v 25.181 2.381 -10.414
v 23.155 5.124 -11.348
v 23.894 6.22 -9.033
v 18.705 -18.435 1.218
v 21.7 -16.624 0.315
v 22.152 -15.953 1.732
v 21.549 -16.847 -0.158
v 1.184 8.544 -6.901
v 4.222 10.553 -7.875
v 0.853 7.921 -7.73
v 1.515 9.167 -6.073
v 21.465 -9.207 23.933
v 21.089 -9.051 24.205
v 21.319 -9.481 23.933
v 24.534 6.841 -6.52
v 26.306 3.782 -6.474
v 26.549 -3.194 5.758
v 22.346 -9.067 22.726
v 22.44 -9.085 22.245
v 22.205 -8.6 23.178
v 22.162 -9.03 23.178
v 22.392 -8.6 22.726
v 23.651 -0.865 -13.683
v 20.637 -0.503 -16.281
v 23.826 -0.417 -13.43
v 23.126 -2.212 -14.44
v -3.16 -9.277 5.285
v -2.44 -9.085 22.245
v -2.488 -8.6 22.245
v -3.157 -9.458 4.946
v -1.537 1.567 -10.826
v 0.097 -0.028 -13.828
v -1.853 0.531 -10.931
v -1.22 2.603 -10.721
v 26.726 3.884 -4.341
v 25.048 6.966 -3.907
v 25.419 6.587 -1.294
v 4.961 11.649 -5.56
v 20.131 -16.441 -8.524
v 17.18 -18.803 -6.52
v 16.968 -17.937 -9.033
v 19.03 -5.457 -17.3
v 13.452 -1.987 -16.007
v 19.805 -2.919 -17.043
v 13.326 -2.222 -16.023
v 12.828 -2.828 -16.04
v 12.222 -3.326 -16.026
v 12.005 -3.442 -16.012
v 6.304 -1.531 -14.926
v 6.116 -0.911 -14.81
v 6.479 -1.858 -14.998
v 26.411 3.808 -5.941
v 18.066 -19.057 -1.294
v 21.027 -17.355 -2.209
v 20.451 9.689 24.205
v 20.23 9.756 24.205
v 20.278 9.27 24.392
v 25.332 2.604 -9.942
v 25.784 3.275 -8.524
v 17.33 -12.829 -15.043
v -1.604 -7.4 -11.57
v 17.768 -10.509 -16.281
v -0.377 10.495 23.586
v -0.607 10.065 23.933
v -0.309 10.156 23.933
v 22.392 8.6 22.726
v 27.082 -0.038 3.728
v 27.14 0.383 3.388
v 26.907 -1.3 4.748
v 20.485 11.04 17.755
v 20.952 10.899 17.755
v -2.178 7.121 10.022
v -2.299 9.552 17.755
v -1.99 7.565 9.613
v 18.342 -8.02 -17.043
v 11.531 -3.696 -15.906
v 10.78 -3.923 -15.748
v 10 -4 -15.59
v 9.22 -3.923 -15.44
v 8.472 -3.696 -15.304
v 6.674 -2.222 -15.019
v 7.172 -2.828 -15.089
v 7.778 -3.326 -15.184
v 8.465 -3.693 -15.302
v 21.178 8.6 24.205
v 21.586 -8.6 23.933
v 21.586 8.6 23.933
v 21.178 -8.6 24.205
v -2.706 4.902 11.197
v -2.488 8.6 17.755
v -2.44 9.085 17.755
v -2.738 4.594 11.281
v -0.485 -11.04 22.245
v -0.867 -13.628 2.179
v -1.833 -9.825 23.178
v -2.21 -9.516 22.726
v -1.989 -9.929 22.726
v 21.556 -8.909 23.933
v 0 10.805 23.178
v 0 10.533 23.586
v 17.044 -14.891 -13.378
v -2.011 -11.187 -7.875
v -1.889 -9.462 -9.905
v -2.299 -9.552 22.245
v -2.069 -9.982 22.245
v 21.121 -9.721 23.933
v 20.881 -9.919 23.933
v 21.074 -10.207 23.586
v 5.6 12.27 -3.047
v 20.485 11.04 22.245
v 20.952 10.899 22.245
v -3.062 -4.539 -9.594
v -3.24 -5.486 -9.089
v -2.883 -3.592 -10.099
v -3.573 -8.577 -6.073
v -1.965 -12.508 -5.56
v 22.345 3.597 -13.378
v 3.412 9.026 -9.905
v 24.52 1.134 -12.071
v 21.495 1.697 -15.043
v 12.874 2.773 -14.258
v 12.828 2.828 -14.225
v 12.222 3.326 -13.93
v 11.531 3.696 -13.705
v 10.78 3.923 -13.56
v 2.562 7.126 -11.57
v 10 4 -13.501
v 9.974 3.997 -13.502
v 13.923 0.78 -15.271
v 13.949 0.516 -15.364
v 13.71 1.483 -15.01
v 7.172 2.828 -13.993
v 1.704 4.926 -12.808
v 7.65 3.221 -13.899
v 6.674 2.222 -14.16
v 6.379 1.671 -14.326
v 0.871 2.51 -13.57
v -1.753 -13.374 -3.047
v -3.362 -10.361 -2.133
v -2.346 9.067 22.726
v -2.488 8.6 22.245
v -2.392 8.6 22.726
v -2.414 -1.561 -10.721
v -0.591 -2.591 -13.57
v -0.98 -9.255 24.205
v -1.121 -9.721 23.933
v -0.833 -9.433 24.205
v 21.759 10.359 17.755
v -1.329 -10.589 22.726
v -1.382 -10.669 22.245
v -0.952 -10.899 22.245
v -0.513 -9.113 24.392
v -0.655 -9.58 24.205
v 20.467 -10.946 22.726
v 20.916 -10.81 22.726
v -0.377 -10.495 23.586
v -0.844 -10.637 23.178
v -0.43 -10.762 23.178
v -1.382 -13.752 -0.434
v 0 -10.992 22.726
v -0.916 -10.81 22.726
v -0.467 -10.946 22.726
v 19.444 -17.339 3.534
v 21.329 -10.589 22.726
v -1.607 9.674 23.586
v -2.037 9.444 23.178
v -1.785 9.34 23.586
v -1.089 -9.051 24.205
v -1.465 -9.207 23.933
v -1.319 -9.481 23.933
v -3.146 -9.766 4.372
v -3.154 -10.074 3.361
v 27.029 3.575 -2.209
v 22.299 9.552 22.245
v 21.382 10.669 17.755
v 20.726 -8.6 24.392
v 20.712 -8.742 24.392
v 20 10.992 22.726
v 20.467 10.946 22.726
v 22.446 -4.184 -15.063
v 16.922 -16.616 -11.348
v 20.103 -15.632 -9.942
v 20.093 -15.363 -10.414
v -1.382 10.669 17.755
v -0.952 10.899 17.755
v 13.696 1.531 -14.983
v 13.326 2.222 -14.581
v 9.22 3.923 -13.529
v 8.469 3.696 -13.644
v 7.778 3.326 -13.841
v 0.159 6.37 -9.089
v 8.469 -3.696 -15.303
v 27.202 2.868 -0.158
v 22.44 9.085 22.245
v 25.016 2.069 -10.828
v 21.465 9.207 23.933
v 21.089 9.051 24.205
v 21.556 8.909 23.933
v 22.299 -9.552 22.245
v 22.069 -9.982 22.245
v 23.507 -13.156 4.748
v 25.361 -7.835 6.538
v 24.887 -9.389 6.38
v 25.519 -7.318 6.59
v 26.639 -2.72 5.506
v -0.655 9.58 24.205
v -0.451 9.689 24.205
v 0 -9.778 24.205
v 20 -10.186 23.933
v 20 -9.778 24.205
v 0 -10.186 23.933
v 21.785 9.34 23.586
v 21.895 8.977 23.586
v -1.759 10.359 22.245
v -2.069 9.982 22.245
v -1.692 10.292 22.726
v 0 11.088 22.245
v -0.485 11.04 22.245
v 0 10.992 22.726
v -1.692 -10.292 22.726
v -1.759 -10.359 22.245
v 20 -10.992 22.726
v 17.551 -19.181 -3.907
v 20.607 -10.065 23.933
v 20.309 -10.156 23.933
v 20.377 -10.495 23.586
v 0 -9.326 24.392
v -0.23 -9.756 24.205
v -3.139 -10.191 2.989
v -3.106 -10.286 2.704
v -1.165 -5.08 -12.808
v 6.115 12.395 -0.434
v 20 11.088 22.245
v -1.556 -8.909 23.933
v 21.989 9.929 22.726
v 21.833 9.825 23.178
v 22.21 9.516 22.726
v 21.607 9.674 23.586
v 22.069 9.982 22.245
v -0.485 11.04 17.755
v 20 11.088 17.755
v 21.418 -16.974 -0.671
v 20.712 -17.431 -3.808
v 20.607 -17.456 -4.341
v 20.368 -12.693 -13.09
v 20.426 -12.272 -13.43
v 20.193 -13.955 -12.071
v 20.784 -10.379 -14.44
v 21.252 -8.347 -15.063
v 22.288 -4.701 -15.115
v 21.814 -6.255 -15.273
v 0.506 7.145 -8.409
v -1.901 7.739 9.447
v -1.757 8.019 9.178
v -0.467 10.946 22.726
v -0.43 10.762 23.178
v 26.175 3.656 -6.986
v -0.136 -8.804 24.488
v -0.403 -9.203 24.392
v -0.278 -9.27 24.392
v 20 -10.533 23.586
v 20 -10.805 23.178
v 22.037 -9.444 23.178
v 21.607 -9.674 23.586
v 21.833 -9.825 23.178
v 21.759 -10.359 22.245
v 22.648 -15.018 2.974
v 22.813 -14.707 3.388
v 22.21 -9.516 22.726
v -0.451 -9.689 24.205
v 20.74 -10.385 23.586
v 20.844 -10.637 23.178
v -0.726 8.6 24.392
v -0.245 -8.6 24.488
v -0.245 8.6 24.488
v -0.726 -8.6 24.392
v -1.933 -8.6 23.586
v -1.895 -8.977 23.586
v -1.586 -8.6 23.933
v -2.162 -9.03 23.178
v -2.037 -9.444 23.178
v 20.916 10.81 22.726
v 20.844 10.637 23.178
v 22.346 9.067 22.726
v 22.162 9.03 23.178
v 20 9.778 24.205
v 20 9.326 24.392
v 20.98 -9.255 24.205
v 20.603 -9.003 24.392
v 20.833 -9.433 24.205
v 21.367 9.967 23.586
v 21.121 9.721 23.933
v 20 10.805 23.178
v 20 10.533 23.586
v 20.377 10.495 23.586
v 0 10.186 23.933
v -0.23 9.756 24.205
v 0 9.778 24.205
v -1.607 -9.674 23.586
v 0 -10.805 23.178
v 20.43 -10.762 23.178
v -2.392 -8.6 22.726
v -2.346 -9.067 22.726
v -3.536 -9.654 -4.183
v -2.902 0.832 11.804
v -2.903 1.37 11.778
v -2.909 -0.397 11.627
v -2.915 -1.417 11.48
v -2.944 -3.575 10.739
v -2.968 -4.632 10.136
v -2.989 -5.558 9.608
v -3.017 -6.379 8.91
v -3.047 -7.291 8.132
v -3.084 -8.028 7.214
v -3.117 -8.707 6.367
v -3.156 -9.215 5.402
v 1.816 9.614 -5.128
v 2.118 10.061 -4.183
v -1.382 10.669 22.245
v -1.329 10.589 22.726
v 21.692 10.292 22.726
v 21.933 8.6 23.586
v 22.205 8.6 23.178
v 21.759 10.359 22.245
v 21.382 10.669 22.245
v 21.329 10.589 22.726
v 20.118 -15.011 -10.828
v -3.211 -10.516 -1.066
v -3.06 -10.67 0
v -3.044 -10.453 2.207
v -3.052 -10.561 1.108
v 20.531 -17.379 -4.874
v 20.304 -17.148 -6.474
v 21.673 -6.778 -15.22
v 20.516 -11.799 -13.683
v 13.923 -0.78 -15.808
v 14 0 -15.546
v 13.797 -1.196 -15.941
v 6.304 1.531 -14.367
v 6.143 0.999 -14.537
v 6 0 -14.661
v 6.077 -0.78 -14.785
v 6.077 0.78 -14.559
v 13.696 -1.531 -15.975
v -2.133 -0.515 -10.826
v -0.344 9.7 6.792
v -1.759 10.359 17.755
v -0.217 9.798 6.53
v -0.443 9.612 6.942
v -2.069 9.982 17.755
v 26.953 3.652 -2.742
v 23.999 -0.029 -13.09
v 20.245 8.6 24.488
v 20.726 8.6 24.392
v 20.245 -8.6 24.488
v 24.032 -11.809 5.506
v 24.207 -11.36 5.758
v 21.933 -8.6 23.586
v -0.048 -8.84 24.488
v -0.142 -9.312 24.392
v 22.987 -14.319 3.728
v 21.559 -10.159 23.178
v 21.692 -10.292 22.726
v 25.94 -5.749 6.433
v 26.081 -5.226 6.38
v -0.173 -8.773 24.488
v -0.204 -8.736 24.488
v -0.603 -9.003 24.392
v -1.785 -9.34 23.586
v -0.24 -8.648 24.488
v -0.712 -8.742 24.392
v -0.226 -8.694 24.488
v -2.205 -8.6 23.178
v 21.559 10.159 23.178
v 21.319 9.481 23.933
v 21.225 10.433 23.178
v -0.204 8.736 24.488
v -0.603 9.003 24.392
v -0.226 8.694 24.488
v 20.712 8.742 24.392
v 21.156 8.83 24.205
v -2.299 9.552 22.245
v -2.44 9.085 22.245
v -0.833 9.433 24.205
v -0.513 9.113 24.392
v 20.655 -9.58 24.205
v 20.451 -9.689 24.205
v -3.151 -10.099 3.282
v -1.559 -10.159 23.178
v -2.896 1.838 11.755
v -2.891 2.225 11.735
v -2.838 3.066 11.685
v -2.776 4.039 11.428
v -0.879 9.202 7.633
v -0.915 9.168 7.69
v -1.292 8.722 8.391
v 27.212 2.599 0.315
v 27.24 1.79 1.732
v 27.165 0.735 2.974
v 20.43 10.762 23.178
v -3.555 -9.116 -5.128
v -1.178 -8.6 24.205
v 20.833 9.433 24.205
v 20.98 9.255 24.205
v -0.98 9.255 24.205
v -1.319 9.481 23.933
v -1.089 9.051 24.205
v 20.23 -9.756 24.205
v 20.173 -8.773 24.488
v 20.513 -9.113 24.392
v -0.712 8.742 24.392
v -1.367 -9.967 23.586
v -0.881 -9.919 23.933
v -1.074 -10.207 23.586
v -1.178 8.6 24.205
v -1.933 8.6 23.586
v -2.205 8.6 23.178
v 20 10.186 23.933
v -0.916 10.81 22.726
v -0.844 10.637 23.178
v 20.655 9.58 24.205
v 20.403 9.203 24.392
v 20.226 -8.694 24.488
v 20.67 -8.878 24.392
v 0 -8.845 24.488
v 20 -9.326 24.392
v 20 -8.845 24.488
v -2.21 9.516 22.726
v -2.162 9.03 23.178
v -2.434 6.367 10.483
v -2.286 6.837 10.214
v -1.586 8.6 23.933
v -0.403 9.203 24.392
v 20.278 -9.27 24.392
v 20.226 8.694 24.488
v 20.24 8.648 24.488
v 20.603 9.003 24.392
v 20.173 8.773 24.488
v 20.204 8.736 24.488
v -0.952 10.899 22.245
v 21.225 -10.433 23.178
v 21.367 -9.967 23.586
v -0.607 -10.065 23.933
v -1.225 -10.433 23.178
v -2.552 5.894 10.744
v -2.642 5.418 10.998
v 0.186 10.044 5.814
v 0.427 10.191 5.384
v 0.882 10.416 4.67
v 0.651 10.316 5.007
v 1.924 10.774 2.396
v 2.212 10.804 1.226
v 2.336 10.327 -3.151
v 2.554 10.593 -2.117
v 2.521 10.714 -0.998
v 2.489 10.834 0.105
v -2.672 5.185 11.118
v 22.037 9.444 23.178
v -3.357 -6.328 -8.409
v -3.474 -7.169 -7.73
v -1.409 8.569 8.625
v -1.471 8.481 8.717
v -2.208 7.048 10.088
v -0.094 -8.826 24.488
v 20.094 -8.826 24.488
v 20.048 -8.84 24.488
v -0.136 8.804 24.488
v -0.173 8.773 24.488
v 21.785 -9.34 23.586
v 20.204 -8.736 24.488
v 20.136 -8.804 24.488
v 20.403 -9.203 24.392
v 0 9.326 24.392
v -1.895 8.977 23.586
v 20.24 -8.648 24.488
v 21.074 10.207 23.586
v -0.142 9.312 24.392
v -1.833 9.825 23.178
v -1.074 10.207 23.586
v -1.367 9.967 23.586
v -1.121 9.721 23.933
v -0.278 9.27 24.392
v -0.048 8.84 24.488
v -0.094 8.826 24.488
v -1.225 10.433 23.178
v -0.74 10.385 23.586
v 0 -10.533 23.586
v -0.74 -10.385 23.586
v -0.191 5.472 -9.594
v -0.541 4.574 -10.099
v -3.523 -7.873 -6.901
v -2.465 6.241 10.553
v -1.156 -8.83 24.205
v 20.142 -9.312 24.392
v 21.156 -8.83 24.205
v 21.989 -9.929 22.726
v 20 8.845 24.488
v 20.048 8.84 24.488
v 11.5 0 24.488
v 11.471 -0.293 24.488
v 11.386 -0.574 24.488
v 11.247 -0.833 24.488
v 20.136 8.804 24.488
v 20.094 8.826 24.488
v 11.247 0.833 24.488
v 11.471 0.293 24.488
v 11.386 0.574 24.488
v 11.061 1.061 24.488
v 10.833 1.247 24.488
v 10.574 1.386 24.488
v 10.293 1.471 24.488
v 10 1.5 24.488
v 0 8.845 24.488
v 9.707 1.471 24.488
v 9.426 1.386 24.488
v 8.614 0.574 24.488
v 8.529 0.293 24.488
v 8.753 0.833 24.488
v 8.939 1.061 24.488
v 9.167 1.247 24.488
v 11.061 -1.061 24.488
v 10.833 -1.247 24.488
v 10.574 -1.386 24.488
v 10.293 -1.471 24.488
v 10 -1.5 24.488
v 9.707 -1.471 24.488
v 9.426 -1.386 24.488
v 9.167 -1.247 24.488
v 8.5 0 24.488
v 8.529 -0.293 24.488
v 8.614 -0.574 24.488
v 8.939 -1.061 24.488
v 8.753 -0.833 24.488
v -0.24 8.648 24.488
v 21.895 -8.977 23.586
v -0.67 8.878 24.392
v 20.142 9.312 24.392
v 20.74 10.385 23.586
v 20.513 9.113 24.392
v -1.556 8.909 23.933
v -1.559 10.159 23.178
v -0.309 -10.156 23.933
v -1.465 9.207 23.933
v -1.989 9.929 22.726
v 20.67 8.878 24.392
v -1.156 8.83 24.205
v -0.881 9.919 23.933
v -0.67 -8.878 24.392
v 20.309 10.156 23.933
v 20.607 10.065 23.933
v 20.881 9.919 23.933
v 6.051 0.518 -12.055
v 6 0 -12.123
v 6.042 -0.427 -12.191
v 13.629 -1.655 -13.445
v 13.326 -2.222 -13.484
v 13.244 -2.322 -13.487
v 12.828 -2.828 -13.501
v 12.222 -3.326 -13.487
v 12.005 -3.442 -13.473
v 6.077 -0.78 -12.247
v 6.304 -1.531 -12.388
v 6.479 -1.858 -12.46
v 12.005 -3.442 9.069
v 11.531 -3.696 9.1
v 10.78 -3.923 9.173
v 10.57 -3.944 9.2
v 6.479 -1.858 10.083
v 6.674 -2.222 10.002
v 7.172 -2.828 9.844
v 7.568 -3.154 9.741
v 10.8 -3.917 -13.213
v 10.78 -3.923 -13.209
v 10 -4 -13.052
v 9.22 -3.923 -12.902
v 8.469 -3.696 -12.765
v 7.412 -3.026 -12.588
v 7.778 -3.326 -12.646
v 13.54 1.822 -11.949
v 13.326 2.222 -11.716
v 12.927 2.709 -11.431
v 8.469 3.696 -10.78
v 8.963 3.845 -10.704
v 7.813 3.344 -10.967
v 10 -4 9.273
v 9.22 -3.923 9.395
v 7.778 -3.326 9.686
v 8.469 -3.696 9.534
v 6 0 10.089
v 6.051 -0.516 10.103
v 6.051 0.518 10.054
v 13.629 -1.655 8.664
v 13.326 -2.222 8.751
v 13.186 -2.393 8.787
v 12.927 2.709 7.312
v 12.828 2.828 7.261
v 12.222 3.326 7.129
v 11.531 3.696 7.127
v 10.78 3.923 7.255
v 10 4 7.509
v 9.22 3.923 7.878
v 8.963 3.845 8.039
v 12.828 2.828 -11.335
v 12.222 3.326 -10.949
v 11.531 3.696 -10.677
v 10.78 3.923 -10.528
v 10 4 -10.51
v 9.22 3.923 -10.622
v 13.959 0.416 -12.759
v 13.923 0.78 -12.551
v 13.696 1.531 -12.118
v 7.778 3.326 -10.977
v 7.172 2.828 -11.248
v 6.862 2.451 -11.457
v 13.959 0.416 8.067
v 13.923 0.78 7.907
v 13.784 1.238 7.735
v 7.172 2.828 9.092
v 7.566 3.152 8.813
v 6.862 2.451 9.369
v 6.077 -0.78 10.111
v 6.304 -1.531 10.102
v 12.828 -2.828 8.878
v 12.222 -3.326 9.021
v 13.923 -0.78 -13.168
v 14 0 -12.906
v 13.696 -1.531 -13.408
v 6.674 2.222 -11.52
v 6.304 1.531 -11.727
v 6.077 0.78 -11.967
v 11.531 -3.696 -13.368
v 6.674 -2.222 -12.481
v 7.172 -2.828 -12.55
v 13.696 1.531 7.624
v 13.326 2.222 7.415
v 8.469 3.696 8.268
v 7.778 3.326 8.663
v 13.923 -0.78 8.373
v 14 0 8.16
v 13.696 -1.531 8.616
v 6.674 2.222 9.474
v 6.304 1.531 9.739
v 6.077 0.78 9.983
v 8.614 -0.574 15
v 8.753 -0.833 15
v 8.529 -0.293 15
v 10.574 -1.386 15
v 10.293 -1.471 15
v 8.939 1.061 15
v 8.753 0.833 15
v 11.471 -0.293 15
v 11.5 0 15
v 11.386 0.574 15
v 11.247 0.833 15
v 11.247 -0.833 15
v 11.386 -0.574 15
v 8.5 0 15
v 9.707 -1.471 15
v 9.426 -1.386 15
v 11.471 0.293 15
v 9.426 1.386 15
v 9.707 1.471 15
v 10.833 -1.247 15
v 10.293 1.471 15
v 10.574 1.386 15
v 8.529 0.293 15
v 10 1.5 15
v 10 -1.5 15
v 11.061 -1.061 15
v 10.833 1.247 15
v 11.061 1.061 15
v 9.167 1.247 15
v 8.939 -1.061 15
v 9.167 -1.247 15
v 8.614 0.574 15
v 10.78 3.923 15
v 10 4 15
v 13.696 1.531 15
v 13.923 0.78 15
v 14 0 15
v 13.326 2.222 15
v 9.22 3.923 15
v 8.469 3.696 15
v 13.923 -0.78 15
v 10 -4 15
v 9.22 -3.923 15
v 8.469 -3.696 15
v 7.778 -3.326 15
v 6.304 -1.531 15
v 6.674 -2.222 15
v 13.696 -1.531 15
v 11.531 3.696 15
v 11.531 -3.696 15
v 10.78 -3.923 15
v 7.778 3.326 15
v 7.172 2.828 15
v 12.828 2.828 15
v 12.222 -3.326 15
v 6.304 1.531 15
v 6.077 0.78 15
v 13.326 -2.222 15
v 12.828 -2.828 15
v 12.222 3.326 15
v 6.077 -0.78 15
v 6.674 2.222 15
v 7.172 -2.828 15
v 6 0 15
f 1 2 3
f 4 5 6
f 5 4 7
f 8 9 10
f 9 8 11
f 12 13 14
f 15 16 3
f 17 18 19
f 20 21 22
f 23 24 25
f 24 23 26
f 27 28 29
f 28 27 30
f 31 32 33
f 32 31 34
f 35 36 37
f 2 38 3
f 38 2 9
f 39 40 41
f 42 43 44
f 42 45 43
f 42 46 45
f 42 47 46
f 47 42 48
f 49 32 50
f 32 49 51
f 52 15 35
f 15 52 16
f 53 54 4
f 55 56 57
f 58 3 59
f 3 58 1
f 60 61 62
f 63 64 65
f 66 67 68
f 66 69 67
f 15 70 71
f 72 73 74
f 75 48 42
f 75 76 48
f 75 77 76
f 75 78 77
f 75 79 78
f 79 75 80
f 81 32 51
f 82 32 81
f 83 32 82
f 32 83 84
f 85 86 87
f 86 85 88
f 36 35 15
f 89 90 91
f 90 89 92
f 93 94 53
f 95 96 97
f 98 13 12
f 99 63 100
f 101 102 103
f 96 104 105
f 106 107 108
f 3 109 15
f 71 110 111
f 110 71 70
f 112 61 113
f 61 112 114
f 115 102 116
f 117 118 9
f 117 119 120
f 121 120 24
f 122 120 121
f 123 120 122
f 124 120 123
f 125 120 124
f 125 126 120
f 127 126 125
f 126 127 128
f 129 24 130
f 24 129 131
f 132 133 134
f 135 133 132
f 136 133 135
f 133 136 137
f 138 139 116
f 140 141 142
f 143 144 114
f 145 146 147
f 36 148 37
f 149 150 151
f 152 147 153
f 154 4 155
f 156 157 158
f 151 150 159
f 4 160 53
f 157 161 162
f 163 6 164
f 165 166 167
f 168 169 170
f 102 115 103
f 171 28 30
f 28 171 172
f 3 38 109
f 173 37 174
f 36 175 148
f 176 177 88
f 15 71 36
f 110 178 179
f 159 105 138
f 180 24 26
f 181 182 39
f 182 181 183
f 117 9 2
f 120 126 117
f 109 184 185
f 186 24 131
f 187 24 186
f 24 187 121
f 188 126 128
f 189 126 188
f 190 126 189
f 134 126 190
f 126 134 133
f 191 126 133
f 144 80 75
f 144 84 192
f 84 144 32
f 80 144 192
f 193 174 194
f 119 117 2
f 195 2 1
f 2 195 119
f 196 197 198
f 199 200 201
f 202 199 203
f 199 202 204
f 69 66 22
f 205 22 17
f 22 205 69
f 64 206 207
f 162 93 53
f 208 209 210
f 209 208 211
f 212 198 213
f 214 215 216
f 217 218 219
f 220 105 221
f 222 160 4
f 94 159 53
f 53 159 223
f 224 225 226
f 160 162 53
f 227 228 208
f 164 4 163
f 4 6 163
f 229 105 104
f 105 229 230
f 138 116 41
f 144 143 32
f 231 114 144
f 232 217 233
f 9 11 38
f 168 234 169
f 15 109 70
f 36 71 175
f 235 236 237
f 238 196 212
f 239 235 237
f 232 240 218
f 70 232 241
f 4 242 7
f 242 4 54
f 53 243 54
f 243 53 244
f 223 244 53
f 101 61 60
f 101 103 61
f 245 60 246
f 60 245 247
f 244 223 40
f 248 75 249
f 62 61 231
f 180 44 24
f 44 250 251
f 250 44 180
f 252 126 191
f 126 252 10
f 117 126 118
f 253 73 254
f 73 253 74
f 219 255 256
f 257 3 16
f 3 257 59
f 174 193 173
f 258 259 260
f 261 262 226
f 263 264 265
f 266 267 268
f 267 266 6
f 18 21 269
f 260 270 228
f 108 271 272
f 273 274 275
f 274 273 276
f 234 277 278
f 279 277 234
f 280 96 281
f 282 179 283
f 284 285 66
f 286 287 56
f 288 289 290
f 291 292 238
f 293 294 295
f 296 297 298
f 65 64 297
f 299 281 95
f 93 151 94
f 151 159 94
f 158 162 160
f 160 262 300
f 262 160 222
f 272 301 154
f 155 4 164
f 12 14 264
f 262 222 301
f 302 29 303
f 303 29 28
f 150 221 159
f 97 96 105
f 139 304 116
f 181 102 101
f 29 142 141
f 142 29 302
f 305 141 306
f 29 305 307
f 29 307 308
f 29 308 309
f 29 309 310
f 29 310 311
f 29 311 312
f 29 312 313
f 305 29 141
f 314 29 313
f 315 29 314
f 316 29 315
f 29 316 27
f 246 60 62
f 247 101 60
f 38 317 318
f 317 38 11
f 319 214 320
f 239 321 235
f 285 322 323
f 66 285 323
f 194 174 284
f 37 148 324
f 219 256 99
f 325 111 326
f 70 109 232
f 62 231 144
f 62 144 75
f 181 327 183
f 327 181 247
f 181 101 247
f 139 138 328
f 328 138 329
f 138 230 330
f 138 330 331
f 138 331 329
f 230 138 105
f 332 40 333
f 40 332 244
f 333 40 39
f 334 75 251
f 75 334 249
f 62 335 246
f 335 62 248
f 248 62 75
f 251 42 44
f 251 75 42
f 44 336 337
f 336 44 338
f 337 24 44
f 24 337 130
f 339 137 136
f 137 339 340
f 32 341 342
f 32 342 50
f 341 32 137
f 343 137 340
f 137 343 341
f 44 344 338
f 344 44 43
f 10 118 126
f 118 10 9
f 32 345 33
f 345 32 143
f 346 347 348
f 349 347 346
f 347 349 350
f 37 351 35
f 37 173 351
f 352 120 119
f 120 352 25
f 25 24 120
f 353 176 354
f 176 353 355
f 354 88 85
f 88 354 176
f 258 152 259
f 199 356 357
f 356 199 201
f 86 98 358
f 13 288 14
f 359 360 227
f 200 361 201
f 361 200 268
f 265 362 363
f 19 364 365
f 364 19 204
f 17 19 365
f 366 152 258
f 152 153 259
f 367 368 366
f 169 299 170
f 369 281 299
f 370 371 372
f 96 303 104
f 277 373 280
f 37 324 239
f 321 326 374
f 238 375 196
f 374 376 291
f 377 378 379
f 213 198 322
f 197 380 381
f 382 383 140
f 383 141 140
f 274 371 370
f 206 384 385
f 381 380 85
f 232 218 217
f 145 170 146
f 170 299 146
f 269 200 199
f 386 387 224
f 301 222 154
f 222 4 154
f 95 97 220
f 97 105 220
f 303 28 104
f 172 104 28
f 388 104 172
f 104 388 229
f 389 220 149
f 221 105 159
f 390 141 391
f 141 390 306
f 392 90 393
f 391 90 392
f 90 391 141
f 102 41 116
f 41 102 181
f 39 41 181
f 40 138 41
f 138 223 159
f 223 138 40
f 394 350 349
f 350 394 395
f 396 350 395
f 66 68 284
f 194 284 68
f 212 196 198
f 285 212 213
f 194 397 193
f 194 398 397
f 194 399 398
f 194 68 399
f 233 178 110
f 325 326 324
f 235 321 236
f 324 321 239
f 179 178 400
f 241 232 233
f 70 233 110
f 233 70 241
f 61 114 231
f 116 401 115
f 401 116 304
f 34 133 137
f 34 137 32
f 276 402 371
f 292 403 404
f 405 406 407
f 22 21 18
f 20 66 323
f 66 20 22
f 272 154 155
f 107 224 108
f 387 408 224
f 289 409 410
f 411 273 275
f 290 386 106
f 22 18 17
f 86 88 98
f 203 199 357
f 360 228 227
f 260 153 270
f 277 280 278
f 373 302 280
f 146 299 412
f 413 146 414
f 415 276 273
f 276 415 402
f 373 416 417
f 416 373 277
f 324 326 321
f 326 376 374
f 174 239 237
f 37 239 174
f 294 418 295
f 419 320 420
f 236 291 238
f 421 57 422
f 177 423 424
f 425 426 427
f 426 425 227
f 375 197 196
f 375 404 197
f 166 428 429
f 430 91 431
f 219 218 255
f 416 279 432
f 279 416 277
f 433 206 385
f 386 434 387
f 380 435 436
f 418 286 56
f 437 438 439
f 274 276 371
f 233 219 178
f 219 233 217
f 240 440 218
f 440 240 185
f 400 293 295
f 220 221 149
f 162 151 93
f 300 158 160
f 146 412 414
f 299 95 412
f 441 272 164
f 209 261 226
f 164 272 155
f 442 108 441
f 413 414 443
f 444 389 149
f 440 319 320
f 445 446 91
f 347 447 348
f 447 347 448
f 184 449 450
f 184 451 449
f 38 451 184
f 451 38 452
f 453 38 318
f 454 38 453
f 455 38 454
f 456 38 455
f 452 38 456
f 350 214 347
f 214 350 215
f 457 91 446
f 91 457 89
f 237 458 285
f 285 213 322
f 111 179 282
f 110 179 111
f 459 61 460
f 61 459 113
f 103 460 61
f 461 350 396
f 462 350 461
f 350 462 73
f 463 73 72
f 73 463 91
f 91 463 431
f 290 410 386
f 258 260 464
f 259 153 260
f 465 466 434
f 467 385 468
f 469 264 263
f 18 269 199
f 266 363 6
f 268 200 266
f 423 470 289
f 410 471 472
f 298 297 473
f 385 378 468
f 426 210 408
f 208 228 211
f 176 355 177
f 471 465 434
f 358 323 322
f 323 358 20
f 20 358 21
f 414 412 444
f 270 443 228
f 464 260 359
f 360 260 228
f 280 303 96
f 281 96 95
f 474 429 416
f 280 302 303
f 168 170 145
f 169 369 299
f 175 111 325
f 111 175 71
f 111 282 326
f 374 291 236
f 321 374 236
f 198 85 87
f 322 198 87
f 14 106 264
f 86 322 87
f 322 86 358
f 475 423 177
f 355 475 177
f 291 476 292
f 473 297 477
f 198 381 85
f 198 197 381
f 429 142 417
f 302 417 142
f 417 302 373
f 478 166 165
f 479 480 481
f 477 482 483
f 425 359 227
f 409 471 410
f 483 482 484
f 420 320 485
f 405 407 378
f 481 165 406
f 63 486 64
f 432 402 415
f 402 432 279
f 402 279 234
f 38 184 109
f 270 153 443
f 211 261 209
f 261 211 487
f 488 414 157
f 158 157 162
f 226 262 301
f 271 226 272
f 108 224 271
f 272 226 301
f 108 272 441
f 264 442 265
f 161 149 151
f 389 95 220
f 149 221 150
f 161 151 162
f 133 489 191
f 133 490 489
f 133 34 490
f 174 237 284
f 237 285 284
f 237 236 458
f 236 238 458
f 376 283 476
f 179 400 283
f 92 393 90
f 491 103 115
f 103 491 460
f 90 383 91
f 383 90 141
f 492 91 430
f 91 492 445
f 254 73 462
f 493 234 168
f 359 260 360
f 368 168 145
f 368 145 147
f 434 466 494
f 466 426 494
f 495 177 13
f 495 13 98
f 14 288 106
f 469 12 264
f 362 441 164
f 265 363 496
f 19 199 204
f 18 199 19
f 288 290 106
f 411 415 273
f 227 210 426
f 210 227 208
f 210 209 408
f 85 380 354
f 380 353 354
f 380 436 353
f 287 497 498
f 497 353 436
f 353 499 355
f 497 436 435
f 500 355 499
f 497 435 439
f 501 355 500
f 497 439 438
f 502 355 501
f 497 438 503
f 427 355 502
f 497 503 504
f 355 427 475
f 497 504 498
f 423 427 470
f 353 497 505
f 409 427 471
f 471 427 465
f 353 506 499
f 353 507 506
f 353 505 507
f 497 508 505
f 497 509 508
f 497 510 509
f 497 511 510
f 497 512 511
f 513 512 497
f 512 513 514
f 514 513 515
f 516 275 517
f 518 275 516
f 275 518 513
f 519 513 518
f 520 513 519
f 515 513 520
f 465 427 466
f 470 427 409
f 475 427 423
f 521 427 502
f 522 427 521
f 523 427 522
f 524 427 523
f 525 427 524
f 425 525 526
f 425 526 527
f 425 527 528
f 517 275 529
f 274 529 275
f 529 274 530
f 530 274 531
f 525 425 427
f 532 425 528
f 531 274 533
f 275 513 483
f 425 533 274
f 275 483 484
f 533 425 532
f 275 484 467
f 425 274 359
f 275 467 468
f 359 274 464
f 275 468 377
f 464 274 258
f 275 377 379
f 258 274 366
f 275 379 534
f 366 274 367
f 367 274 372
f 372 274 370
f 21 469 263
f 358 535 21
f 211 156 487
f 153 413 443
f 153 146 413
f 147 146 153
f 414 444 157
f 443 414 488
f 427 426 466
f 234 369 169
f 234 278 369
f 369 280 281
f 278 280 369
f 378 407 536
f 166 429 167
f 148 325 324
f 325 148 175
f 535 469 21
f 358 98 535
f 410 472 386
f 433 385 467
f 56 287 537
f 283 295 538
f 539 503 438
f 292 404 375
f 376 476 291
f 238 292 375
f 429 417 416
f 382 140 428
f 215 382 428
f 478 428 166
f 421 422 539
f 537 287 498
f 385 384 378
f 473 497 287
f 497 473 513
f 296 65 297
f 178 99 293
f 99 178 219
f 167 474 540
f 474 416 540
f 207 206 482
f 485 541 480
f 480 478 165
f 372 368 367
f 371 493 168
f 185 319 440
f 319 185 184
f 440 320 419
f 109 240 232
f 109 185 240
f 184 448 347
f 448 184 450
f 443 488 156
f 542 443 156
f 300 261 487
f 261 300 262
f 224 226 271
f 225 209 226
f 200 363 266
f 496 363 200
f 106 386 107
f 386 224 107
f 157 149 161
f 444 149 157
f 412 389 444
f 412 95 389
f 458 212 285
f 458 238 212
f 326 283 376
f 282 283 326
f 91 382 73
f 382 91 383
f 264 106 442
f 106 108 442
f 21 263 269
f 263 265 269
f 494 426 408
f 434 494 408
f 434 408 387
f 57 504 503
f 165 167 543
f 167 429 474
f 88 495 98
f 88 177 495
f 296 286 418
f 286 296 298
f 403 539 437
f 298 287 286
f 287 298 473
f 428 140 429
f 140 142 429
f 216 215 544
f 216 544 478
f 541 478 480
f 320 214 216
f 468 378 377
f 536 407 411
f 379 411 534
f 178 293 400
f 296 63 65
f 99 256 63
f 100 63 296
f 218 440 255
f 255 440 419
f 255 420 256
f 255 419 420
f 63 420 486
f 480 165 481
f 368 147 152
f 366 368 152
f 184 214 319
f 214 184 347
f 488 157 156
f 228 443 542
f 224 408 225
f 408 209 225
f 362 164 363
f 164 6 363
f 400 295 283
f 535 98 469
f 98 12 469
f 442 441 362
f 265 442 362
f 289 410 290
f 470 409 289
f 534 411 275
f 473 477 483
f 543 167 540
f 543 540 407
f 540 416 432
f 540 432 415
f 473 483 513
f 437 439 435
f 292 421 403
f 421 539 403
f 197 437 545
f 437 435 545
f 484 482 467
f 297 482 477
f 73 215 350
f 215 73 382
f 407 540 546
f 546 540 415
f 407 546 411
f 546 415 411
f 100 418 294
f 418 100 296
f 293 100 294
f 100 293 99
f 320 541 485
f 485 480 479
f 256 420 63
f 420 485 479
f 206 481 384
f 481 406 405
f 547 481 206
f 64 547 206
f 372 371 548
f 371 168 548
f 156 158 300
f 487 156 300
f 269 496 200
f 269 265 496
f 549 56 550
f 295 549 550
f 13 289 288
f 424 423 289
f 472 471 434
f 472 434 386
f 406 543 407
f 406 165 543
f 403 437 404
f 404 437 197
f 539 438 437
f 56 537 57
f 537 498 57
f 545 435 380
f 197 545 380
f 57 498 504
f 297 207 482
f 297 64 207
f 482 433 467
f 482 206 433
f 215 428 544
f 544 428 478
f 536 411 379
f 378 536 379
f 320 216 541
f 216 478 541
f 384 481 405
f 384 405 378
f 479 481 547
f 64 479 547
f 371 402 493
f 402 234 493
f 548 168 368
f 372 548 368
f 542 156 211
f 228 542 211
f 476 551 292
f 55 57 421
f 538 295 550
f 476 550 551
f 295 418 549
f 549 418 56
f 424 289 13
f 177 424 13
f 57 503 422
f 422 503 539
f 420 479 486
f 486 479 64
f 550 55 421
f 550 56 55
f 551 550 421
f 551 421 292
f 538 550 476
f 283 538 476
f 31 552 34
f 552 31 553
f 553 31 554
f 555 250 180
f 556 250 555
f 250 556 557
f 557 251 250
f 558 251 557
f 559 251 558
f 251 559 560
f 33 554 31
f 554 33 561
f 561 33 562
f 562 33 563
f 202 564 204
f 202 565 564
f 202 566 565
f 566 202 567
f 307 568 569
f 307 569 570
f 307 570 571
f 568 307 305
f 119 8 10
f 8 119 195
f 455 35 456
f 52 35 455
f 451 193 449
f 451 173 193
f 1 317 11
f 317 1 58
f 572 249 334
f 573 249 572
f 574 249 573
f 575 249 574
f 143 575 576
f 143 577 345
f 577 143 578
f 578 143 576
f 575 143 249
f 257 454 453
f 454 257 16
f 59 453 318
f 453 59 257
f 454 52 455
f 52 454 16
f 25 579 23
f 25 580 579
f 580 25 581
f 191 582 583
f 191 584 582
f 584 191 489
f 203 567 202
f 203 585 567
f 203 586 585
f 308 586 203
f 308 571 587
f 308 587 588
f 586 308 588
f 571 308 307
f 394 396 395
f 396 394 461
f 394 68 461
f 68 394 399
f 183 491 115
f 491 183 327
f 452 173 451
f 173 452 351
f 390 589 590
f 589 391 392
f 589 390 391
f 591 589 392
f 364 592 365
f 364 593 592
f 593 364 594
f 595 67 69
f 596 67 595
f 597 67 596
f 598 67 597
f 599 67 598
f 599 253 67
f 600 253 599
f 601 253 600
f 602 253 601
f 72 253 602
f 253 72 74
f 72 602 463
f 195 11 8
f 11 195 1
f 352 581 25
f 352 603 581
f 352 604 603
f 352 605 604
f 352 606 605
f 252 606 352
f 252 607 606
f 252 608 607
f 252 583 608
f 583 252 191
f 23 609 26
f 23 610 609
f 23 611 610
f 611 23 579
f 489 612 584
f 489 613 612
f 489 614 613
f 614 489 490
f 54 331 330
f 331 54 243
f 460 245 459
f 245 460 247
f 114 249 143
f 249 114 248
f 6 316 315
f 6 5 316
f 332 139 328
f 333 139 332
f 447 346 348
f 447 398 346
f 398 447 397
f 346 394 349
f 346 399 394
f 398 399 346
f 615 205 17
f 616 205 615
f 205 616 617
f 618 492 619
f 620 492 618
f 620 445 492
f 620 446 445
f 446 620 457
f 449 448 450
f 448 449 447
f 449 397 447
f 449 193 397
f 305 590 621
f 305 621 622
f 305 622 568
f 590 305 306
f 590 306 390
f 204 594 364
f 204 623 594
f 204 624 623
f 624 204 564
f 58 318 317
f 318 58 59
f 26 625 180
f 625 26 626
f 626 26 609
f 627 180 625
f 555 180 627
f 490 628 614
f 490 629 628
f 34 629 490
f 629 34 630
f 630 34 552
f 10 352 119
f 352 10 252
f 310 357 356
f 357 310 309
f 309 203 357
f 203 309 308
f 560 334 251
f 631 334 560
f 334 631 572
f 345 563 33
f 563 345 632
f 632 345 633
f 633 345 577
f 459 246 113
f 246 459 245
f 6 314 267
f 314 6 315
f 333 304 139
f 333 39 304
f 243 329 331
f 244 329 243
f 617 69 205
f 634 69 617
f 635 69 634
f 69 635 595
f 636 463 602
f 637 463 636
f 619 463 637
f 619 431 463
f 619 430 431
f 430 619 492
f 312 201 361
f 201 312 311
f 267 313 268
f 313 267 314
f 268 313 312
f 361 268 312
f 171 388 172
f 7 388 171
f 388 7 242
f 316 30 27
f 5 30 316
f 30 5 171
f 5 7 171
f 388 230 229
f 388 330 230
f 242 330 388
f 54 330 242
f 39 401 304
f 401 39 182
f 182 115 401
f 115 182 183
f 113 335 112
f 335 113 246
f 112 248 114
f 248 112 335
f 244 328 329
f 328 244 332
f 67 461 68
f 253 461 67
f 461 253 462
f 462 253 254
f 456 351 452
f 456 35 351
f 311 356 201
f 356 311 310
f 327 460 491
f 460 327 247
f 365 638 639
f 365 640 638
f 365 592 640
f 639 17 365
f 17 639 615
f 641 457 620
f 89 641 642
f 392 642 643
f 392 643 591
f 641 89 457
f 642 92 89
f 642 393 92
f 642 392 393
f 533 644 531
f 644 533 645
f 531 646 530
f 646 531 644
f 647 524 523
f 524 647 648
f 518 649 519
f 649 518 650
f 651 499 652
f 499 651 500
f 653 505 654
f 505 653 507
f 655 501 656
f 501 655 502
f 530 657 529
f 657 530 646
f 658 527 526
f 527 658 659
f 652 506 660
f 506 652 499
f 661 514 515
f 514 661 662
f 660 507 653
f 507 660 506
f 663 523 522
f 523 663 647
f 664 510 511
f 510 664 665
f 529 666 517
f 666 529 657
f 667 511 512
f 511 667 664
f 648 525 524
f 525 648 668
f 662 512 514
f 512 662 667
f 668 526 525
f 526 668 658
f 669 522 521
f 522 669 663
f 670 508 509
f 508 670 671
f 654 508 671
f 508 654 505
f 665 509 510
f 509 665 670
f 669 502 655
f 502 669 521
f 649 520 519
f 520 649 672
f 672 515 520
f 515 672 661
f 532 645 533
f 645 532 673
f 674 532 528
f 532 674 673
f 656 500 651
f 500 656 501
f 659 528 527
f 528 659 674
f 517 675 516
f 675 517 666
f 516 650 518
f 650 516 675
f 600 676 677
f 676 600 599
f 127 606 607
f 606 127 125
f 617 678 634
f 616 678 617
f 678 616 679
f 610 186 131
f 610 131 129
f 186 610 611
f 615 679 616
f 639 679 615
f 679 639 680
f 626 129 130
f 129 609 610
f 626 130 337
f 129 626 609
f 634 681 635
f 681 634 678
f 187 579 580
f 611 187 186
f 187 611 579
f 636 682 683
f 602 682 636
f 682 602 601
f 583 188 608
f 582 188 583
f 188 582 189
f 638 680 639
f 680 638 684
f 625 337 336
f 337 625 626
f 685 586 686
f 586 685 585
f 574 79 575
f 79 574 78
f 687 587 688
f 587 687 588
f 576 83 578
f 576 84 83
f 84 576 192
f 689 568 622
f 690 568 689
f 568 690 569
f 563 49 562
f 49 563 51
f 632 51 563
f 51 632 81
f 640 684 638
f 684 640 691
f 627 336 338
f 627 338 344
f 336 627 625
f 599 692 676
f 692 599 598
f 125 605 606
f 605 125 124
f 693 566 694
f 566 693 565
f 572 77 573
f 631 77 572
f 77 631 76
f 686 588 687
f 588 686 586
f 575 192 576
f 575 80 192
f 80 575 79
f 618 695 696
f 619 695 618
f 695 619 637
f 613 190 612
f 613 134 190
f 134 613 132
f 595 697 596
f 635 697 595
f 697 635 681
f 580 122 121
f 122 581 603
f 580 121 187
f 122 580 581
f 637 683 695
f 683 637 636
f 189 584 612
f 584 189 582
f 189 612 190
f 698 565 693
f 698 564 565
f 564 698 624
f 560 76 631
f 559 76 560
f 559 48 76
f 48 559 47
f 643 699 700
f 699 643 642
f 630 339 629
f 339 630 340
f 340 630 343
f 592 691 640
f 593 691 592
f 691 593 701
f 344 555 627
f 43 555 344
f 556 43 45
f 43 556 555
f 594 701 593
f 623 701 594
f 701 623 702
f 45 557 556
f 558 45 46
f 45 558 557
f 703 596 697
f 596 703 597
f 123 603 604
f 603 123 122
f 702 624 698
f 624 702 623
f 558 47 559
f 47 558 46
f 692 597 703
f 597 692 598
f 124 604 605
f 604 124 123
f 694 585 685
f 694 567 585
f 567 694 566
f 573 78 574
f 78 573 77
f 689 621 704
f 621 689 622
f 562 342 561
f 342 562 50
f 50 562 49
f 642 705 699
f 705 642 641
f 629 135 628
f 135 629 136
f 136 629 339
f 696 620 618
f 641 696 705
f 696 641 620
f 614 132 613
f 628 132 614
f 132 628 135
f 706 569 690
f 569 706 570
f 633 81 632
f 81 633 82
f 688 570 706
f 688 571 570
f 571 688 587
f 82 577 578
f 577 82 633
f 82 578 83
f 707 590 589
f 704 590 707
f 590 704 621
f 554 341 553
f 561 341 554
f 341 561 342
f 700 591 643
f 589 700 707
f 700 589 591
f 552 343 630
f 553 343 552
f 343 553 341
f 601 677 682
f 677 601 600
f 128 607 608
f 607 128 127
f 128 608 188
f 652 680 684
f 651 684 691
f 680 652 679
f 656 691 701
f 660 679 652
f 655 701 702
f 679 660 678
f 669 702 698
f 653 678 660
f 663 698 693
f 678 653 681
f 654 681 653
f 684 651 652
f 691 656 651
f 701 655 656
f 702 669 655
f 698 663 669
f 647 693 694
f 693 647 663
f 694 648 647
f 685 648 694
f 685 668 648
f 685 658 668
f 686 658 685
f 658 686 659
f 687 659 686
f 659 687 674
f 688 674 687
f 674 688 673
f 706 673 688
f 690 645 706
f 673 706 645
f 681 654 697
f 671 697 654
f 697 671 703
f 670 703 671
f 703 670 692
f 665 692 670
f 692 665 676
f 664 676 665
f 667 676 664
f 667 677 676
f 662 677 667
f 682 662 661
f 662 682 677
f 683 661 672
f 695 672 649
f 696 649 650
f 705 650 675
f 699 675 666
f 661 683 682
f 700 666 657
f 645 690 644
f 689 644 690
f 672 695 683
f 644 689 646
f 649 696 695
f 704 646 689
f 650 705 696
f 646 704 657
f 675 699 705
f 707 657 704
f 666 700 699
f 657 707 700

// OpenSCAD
// to make a flat, forward facing landing place for
// a headlight etc on these SQLabs 310 Sport bars.
$fn=32;

bd = 22.2;   // bar dia
br = -10;     // bar rise angle
bs = 16;     // bar sweep angle

ll = 20;
tt = 2.5;

module roundedcube(lx,ly,lz,cr) {
    hull() {
        for (sx=[-1,1]) for (sy=[-1,1]) for (sz=[-1,1]) {
            translate([sx*(lx/2-cr),sy*(ly/2-cr),sz*(lz/2-cr)]) sphere(r=cr);
        }
    }
}

difference() {
    hull() {
        rotate([0,0,-bs]) rotate([0,90-br,0]) {
            cylinder(h=tt, d1=bd, d2=bd+2*tt);
            translate([0,0,tt]) cylinder(h=ll, d=bd+2*tt);
            translate([0,0,ll+tt]) cylinder(h=tt, d1=bd+2*tt, d2=bd);
        }
        translate([ll/2,0,20]) roundedcube(ll+2*tt,bd,1,tt);
        //translate([0,0,25]) rotate([0,90,0]) cylinder(h=ll, d=bd);
    }  
    rotate([0,0,-bs]) rotate([0,90-br,0]) cylinder(h=100, d=bd, center=true);
    translate([ll/2,0,0]) cylinder(d=3,h=100,center=true);
    translate([ll/2,0,-5]) cylinder(d=8,h=40,center=true);
    
}
